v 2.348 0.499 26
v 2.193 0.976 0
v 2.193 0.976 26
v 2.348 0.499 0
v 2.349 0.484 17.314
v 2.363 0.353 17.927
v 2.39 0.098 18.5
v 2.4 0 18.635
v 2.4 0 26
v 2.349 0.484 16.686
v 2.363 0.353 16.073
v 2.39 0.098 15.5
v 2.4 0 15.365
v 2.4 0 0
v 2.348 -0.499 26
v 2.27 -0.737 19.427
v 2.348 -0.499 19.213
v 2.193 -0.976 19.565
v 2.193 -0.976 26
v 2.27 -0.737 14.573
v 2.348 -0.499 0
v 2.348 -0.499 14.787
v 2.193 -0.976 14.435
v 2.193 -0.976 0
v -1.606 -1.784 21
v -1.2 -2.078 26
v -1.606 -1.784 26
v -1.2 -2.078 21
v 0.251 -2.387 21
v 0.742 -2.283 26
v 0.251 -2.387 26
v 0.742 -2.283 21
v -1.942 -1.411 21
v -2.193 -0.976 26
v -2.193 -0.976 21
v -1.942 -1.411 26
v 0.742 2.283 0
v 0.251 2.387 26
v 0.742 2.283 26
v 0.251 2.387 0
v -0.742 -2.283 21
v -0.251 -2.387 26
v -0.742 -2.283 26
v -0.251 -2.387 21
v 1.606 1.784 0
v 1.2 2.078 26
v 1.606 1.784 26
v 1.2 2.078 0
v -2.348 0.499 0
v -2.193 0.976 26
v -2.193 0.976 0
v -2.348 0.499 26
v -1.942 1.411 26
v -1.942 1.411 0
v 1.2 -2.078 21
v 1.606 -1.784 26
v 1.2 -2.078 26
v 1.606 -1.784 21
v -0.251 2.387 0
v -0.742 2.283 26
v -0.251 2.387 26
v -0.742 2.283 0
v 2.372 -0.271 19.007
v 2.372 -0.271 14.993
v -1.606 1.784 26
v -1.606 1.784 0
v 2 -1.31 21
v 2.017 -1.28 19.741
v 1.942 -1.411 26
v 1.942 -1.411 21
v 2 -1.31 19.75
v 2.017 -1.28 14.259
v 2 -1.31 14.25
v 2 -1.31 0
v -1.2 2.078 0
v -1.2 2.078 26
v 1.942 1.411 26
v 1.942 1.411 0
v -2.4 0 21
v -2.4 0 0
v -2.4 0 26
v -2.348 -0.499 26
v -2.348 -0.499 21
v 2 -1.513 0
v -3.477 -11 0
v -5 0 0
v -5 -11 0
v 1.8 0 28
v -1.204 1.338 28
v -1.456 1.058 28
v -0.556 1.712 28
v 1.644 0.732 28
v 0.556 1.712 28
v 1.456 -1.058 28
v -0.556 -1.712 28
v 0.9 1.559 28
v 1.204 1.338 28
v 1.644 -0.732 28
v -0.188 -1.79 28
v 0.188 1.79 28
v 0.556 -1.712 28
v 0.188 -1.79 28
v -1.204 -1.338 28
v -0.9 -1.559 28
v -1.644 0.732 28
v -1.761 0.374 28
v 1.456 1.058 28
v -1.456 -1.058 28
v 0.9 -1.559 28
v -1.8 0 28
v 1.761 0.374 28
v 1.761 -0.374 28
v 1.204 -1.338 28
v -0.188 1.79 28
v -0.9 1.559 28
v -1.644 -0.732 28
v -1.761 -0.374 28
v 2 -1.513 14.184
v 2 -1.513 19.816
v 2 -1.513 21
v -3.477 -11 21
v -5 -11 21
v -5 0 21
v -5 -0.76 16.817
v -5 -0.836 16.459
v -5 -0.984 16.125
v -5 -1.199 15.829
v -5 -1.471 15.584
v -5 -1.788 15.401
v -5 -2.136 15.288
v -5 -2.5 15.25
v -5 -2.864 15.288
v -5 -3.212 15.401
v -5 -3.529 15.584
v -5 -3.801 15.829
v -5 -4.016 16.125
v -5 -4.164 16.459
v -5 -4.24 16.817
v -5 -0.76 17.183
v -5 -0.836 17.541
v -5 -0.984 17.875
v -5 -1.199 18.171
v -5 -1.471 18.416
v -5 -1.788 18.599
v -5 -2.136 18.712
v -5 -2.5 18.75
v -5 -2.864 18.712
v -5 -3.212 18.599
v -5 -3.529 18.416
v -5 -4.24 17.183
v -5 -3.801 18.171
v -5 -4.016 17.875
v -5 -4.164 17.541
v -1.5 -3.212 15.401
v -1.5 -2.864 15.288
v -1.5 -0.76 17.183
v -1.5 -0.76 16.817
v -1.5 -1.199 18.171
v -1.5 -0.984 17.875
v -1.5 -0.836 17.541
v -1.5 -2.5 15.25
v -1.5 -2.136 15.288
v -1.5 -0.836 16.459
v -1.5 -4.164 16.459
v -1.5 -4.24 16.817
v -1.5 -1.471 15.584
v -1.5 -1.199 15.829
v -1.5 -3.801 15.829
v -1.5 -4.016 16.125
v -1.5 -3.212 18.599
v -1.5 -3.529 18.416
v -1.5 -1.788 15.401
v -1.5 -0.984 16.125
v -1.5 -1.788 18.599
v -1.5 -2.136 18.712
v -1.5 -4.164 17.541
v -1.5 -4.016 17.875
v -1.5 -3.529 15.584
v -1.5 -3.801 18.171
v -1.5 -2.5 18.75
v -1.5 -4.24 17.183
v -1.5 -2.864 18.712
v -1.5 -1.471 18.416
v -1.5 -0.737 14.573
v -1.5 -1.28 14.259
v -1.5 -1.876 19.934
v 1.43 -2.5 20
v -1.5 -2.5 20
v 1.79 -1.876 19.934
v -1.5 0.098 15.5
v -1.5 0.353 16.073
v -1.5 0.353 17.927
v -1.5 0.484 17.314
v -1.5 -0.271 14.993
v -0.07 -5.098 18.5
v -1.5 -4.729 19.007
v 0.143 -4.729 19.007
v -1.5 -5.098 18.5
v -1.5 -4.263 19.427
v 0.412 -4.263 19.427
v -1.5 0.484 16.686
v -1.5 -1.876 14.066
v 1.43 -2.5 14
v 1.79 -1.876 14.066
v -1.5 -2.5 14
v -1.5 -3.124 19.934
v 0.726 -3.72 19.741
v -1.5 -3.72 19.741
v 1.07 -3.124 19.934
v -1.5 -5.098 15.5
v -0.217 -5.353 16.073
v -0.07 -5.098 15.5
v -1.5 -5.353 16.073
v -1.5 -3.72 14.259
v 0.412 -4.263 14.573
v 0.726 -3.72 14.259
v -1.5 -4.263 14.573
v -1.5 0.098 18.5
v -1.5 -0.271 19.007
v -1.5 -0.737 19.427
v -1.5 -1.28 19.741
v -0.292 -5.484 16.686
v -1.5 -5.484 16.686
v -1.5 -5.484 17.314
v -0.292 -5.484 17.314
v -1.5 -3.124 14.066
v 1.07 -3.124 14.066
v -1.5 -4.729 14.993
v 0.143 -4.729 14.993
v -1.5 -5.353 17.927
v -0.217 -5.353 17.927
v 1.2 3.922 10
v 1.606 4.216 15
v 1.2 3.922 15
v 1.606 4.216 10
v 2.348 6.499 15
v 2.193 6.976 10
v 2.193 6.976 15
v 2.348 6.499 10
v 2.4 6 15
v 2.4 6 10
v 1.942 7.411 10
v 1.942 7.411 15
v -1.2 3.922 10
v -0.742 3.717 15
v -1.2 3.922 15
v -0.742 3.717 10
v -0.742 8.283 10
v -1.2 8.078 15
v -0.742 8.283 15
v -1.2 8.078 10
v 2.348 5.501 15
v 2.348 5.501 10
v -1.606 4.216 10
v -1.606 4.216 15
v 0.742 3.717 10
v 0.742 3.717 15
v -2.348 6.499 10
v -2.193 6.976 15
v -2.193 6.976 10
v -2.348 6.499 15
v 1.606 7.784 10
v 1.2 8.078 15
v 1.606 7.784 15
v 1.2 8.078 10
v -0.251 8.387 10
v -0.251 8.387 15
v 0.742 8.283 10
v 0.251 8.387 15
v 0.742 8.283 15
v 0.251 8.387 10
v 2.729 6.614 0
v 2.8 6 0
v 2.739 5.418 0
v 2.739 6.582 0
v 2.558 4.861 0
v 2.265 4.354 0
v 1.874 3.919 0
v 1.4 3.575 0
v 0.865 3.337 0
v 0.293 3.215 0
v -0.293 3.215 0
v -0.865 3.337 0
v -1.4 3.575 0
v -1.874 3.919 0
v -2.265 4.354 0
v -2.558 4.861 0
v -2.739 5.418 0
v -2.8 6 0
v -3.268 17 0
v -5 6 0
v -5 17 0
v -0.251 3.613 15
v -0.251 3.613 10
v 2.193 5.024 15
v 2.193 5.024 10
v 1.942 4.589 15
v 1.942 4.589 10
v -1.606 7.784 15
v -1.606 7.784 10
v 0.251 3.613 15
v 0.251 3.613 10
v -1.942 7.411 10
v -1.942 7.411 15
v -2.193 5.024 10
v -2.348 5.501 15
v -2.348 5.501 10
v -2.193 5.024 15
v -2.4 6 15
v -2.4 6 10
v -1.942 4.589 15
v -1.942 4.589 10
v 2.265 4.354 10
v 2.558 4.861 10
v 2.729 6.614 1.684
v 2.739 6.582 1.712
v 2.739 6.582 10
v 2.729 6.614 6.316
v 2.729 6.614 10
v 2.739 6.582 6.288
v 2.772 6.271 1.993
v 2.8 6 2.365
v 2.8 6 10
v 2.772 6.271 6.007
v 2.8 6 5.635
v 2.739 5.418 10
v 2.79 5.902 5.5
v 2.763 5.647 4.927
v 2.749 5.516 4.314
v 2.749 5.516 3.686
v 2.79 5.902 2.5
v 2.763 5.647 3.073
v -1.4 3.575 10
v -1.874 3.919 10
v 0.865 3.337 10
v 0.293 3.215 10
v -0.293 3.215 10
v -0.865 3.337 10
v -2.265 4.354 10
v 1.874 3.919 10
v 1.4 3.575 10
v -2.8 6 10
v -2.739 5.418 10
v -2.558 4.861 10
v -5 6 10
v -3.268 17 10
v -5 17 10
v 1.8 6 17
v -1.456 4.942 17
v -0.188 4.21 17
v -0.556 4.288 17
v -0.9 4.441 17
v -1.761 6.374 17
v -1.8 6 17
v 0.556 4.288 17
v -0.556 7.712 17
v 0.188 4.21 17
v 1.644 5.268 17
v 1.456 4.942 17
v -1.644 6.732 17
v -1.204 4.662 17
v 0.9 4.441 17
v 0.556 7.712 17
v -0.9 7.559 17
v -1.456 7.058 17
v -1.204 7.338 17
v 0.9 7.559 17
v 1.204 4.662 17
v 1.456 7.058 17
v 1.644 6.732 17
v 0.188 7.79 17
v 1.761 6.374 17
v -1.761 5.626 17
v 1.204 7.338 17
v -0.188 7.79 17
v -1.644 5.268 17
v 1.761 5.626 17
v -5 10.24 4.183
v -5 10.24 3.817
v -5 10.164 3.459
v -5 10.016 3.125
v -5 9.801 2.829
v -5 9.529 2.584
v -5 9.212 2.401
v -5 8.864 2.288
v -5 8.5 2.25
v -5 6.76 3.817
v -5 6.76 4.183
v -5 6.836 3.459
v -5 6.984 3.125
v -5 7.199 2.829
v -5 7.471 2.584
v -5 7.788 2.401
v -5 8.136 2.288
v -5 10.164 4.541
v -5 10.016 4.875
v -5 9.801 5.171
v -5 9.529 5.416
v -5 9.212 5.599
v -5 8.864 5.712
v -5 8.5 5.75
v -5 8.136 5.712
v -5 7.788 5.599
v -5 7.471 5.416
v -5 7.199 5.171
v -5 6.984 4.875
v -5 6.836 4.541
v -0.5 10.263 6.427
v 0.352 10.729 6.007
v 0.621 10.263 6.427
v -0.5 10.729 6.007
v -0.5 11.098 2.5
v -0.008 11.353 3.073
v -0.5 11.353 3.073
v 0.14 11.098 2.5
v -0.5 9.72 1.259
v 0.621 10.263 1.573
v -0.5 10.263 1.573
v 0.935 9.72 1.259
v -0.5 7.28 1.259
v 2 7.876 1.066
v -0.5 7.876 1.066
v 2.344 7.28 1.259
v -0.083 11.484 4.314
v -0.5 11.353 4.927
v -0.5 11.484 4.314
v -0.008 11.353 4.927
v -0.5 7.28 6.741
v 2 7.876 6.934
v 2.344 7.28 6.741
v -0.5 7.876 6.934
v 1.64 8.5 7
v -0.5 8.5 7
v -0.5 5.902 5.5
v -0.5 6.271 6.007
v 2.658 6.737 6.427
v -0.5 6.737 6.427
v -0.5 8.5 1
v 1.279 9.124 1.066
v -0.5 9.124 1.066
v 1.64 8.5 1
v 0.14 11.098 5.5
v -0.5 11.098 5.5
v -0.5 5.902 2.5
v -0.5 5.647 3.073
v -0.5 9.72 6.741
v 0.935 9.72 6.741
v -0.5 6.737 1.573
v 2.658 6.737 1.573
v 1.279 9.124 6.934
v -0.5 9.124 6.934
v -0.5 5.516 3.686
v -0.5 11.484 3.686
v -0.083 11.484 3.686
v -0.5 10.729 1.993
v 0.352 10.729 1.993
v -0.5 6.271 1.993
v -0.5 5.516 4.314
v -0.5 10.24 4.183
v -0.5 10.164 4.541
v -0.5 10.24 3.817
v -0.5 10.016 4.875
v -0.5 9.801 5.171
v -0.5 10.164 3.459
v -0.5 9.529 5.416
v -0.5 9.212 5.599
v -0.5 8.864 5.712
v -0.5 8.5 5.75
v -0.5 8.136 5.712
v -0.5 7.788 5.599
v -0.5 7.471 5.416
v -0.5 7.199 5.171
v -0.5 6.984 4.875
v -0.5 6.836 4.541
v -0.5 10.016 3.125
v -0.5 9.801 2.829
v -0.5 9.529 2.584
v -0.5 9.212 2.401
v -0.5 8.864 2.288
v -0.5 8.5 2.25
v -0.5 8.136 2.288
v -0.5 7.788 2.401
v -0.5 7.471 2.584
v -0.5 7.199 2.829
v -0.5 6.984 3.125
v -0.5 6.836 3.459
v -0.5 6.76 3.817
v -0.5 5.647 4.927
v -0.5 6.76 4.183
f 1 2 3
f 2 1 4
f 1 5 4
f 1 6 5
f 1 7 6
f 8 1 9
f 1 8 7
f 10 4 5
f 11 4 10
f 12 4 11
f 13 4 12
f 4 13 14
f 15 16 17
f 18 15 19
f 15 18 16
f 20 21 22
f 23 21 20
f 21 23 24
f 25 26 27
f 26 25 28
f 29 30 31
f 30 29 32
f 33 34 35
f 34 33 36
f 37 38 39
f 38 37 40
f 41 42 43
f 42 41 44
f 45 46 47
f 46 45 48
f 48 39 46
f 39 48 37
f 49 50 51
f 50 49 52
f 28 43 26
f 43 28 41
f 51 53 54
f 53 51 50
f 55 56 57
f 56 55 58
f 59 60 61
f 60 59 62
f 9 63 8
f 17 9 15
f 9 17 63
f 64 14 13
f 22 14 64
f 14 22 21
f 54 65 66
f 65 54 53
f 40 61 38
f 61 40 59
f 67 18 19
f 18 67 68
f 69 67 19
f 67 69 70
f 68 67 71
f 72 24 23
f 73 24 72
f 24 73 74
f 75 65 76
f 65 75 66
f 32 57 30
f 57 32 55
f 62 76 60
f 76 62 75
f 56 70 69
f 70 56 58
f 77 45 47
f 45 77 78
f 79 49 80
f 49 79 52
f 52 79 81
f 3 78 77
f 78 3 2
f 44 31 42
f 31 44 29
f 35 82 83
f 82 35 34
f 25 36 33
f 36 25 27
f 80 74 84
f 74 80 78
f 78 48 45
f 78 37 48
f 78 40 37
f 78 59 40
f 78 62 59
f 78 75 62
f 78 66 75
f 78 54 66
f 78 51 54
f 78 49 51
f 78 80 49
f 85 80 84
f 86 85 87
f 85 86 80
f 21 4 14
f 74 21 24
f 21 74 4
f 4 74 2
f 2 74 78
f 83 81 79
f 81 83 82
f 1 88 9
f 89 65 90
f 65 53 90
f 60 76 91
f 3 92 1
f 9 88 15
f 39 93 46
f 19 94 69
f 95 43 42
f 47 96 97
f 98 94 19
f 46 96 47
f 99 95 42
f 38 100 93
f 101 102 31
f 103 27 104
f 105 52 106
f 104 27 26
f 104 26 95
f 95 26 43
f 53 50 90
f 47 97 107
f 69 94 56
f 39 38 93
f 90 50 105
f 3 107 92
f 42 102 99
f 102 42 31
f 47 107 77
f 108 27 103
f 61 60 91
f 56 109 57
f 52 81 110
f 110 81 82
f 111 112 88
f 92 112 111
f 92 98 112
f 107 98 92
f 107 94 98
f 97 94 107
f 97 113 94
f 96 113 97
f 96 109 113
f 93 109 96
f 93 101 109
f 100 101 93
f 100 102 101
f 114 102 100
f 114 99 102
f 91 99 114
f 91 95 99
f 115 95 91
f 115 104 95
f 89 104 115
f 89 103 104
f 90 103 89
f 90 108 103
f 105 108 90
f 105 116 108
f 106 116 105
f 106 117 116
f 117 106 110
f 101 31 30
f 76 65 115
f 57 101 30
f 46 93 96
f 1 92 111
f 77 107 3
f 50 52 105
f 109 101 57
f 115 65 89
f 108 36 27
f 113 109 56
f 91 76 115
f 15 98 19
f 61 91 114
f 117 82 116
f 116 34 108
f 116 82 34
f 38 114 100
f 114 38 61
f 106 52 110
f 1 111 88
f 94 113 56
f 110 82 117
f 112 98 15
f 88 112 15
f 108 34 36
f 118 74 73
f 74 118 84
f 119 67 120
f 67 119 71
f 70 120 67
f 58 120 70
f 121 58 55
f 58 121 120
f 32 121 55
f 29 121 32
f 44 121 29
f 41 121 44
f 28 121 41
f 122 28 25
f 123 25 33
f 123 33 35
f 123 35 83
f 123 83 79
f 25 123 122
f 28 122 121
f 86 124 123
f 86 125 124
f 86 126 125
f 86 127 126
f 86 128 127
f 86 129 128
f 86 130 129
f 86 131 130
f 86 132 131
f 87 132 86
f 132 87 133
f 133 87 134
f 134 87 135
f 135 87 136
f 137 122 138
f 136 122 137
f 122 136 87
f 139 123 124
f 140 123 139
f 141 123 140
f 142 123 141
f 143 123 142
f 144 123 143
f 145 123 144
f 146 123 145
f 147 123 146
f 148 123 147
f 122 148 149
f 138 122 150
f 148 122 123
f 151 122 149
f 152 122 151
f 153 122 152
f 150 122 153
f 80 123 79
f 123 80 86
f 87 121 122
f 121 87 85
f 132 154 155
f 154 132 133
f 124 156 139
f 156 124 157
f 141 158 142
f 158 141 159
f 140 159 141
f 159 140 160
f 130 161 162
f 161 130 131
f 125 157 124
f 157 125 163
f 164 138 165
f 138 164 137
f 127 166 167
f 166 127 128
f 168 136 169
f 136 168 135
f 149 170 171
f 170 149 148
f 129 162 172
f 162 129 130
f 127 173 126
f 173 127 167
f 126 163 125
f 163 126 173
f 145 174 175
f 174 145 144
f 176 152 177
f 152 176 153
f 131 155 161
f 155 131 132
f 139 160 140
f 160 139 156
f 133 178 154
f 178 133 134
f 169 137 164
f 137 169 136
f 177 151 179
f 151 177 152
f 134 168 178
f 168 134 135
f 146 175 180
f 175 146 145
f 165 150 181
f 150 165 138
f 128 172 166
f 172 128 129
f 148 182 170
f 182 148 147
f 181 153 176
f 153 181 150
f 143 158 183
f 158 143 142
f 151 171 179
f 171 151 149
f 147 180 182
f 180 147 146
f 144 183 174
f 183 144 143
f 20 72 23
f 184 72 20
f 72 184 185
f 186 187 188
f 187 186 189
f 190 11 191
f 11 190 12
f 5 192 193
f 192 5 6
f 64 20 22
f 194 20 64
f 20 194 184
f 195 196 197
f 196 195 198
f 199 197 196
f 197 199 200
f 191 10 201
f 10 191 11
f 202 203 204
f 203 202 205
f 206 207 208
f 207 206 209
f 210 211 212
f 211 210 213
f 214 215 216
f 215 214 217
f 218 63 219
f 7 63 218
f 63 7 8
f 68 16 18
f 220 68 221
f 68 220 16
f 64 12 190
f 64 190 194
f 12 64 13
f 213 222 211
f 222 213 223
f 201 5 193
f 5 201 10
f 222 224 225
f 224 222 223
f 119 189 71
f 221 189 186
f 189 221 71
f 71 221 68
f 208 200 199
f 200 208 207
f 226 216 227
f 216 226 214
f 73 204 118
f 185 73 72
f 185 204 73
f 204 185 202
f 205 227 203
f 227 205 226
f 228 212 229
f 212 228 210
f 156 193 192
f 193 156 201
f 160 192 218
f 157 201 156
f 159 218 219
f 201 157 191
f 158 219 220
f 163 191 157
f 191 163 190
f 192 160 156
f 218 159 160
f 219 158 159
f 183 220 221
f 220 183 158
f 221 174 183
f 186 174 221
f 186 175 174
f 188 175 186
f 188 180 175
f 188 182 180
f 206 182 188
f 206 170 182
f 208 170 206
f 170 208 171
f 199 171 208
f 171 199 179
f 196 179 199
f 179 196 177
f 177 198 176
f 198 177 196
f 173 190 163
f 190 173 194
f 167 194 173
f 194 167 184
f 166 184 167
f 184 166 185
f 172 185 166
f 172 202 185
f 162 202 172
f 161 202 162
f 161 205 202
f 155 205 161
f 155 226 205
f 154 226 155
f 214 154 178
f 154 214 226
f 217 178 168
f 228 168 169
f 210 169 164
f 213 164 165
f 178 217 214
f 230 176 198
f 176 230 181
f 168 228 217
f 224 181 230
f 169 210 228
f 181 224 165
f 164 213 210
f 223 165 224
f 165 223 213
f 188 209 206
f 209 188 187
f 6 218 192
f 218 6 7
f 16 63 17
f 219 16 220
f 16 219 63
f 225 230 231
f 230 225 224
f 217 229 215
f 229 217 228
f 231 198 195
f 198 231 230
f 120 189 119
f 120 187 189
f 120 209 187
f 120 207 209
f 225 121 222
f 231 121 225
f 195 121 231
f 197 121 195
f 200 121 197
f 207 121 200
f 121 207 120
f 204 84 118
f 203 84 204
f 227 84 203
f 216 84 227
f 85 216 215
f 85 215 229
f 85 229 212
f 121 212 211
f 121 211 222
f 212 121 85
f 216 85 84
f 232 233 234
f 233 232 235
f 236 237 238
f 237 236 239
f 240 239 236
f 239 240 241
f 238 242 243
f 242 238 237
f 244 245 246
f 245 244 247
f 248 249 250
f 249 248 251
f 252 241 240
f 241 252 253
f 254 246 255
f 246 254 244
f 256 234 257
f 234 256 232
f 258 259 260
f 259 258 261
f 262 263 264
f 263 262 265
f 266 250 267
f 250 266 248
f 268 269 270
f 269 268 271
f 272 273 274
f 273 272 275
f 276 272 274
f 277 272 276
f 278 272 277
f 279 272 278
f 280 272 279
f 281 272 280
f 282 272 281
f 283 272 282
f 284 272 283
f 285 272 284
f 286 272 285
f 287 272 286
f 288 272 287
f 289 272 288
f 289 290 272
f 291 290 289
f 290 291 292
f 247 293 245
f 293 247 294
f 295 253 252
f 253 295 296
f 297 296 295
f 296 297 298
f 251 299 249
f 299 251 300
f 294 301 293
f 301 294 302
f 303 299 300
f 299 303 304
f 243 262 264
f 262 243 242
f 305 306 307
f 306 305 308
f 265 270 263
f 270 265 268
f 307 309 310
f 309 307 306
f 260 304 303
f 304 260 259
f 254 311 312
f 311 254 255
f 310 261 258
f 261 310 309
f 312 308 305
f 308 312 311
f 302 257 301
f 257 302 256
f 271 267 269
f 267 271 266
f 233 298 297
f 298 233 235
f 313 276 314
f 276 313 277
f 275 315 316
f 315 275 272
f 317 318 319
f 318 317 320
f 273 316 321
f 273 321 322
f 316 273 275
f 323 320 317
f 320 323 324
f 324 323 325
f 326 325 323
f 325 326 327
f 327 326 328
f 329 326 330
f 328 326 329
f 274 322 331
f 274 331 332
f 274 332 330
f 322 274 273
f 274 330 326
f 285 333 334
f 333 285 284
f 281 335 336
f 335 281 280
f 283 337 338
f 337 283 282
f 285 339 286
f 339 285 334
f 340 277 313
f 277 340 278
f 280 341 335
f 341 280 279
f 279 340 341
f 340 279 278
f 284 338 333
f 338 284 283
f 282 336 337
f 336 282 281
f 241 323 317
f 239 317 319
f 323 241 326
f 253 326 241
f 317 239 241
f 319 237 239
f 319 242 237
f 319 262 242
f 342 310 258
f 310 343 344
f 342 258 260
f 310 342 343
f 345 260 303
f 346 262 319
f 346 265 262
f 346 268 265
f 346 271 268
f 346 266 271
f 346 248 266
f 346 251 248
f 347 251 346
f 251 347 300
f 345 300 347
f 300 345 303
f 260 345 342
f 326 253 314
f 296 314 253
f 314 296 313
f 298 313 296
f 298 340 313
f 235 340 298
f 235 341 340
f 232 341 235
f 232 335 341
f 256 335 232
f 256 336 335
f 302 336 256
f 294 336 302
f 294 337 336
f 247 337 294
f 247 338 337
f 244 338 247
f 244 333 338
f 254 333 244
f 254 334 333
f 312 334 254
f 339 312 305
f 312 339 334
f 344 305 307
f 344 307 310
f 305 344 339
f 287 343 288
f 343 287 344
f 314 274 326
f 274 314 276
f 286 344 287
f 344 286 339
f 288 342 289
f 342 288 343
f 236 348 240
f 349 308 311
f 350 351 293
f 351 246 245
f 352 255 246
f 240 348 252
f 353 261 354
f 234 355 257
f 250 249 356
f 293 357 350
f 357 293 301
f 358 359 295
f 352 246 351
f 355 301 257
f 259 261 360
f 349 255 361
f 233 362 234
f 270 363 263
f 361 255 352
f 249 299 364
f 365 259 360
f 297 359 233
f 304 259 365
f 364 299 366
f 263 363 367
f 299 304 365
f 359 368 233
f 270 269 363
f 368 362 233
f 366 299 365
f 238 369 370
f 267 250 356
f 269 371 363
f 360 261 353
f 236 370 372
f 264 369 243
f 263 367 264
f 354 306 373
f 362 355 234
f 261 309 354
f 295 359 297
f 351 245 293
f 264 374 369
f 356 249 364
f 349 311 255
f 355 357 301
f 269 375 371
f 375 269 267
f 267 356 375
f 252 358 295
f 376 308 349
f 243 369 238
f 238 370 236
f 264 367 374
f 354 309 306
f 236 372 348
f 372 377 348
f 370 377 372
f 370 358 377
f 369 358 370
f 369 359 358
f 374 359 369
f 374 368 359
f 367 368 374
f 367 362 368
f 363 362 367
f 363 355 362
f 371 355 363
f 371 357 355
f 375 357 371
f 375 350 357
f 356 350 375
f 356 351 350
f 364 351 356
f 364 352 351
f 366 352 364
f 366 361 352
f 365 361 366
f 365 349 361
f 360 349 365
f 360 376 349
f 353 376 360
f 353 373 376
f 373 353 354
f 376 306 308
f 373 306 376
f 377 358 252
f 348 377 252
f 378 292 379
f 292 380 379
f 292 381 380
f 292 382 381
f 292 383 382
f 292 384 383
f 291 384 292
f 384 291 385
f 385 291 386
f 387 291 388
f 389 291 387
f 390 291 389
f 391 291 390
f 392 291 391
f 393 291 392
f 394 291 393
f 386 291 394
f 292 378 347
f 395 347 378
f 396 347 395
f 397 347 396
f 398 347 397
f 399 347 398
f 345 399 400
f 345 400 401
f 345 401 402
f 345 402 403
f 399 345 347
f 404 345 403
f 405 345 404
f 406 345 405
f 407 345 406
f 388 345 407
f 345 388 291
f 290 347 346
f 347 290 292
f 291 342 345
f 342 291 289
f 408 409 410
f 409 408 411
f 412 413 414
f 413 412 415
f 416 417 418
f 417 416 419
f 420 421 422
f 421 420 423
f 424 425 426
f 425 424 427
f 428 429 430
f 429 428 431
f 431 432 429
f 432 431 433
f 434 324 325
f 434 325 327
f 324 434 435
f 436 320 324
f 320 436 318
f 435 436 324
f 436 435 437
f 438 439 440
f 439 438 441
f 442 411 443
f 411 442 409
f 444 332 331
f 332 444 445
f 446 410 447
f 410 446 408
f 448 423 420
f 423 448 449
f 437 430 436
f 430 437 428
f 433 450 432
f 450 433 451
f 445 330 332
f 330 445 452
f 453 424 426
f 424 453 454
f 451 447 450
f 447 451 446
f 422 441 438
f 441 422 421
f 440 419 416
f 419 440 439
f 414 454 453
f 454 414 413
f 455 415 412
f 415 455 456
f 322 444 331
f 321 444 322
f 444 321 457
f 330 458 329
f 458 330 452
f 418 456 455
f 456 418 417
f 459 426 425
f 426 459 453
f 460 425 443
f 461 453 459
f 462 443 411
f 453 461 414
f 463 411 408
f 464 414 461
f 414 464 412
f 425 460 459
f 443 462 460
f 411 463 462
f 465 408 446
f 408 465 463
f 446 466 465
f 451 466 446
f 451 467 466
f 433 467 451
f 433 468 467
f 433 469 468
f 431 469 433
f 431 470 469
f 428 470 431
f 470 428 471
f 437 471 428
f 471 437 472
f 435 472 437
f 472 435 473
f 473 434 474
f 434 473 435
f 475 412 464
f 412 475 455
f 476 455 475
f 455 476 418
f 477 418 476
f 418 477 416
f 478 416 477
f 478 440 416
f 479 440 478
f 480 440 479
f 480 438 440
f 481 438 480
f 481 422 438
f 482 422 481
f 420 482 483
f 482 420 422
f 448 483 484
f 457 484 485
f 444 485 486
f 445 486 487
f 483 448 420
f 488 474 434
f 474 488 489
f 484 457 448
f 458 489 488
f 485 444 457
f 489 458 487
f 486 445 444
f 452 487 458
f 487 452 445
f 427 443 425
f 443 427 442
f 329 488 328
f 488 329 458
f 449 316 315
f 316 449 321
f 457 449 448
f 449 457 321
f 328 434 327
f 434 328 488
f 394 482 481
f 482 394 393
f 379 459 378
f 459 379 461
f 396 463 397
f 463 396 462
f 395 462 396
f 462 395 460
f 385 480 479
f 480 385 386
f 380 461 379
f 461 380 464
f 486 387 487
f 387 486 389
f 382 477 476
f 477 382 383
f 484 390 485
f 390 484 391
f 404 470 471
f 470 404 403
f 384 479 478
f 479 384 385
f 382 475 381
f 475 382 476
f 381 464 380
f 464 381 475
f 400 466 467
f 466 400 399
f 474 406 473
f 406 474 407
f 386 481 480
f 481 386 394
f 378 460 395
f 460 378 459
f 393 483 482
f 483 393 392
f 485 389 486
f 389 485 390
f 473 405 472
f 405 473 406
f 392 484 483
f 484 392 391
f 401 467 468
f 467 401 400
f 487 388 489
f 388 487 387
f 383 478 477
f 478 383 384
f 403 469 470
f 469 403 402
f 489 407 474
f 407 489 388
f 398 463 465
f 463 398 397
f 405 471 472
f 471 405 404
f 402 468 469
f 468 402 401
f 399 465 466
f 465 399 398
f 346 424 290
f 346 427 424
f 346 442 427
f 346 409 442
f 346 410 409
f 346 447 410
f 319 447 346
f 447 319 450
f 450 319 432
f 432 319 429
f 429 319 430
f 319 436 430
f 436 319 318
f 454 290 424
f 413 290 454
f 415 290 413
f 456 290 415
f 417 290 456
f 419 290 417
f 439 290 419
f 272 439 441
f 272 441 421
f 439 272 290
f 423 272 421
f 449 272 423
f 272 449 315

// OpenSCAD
// PRUSA iteration4
// Einsy cover hinges
// GNU GPL v3
// Josef Průša <iam@josefprusa.cz> and contributors
// http://www.reprap.org/wiki/Prusa_Mendel
// http://prusamendel.org

module upper_hinge()
{
difference()    
{
    union(){
     // body
     cylinder( h = 26, r = 2.4, $fn=30); 
     translate([0,0,26]) cylinder( h = 2, r1 = 2.4, r2 = 1.8, $fn=30); 
     translate( [ -5 , -11 , 0 ] ) cube( [ 7 , 11 , 21 ] );  
    }
     // M3 screw hole
     translate( [ -12.5 , -2.5 , 17 ] ) rotate( [0,90,0] ) cylinder( h = 20, r = 1.75, $fn=30);  
     translate( [ -1.5 , -2.5 , 17 ] ) rotate( [0,90,0] ) cylinder( h = 9, r = 3, $fn=30); 
     // angle cut
     translate([-2.9,-20,-1]) rotate([0,0,60]) cube([25,5,26]);   
}
}

module lower_hinge()
{
difference()
{   
   union(){ 
    // body   
    translate( [ 0 , 6 , 0 ] ) cylinder( h = 15, r = 2.4, $fn=30); 
    translate( [ 0 , 6 , 0 ] ) cylinder( h = 10, r = 2.8, $fn=30);  
    translate( [ 0 , 6 , 15 ] ) cylinder( h = 2, r1 = 2.4, r2=1.8, $fn=30);  
    translate( [ -5 , 6 , 0 ] ) cube( [ 7 , 11 , 10 ] ); 
   }
    // M3 screw
    translate( [ -0.5 , 8.5 , 4 ] ) rotate( [0,90,0] ) cylinder( h = 20, r = 3, $fn=30); 
    translate( [ -12 , 8.5 , 4 ] ) rotate( [0,90,0] ) cylinder( h = 20, r = 1.75, $fn=30); 
    // angle cut
    translate([-5,20,-1]) rotate([0,0,-60]) cube([20,5,20]);   
}
}


upper_hinge();
lower_hinge();
